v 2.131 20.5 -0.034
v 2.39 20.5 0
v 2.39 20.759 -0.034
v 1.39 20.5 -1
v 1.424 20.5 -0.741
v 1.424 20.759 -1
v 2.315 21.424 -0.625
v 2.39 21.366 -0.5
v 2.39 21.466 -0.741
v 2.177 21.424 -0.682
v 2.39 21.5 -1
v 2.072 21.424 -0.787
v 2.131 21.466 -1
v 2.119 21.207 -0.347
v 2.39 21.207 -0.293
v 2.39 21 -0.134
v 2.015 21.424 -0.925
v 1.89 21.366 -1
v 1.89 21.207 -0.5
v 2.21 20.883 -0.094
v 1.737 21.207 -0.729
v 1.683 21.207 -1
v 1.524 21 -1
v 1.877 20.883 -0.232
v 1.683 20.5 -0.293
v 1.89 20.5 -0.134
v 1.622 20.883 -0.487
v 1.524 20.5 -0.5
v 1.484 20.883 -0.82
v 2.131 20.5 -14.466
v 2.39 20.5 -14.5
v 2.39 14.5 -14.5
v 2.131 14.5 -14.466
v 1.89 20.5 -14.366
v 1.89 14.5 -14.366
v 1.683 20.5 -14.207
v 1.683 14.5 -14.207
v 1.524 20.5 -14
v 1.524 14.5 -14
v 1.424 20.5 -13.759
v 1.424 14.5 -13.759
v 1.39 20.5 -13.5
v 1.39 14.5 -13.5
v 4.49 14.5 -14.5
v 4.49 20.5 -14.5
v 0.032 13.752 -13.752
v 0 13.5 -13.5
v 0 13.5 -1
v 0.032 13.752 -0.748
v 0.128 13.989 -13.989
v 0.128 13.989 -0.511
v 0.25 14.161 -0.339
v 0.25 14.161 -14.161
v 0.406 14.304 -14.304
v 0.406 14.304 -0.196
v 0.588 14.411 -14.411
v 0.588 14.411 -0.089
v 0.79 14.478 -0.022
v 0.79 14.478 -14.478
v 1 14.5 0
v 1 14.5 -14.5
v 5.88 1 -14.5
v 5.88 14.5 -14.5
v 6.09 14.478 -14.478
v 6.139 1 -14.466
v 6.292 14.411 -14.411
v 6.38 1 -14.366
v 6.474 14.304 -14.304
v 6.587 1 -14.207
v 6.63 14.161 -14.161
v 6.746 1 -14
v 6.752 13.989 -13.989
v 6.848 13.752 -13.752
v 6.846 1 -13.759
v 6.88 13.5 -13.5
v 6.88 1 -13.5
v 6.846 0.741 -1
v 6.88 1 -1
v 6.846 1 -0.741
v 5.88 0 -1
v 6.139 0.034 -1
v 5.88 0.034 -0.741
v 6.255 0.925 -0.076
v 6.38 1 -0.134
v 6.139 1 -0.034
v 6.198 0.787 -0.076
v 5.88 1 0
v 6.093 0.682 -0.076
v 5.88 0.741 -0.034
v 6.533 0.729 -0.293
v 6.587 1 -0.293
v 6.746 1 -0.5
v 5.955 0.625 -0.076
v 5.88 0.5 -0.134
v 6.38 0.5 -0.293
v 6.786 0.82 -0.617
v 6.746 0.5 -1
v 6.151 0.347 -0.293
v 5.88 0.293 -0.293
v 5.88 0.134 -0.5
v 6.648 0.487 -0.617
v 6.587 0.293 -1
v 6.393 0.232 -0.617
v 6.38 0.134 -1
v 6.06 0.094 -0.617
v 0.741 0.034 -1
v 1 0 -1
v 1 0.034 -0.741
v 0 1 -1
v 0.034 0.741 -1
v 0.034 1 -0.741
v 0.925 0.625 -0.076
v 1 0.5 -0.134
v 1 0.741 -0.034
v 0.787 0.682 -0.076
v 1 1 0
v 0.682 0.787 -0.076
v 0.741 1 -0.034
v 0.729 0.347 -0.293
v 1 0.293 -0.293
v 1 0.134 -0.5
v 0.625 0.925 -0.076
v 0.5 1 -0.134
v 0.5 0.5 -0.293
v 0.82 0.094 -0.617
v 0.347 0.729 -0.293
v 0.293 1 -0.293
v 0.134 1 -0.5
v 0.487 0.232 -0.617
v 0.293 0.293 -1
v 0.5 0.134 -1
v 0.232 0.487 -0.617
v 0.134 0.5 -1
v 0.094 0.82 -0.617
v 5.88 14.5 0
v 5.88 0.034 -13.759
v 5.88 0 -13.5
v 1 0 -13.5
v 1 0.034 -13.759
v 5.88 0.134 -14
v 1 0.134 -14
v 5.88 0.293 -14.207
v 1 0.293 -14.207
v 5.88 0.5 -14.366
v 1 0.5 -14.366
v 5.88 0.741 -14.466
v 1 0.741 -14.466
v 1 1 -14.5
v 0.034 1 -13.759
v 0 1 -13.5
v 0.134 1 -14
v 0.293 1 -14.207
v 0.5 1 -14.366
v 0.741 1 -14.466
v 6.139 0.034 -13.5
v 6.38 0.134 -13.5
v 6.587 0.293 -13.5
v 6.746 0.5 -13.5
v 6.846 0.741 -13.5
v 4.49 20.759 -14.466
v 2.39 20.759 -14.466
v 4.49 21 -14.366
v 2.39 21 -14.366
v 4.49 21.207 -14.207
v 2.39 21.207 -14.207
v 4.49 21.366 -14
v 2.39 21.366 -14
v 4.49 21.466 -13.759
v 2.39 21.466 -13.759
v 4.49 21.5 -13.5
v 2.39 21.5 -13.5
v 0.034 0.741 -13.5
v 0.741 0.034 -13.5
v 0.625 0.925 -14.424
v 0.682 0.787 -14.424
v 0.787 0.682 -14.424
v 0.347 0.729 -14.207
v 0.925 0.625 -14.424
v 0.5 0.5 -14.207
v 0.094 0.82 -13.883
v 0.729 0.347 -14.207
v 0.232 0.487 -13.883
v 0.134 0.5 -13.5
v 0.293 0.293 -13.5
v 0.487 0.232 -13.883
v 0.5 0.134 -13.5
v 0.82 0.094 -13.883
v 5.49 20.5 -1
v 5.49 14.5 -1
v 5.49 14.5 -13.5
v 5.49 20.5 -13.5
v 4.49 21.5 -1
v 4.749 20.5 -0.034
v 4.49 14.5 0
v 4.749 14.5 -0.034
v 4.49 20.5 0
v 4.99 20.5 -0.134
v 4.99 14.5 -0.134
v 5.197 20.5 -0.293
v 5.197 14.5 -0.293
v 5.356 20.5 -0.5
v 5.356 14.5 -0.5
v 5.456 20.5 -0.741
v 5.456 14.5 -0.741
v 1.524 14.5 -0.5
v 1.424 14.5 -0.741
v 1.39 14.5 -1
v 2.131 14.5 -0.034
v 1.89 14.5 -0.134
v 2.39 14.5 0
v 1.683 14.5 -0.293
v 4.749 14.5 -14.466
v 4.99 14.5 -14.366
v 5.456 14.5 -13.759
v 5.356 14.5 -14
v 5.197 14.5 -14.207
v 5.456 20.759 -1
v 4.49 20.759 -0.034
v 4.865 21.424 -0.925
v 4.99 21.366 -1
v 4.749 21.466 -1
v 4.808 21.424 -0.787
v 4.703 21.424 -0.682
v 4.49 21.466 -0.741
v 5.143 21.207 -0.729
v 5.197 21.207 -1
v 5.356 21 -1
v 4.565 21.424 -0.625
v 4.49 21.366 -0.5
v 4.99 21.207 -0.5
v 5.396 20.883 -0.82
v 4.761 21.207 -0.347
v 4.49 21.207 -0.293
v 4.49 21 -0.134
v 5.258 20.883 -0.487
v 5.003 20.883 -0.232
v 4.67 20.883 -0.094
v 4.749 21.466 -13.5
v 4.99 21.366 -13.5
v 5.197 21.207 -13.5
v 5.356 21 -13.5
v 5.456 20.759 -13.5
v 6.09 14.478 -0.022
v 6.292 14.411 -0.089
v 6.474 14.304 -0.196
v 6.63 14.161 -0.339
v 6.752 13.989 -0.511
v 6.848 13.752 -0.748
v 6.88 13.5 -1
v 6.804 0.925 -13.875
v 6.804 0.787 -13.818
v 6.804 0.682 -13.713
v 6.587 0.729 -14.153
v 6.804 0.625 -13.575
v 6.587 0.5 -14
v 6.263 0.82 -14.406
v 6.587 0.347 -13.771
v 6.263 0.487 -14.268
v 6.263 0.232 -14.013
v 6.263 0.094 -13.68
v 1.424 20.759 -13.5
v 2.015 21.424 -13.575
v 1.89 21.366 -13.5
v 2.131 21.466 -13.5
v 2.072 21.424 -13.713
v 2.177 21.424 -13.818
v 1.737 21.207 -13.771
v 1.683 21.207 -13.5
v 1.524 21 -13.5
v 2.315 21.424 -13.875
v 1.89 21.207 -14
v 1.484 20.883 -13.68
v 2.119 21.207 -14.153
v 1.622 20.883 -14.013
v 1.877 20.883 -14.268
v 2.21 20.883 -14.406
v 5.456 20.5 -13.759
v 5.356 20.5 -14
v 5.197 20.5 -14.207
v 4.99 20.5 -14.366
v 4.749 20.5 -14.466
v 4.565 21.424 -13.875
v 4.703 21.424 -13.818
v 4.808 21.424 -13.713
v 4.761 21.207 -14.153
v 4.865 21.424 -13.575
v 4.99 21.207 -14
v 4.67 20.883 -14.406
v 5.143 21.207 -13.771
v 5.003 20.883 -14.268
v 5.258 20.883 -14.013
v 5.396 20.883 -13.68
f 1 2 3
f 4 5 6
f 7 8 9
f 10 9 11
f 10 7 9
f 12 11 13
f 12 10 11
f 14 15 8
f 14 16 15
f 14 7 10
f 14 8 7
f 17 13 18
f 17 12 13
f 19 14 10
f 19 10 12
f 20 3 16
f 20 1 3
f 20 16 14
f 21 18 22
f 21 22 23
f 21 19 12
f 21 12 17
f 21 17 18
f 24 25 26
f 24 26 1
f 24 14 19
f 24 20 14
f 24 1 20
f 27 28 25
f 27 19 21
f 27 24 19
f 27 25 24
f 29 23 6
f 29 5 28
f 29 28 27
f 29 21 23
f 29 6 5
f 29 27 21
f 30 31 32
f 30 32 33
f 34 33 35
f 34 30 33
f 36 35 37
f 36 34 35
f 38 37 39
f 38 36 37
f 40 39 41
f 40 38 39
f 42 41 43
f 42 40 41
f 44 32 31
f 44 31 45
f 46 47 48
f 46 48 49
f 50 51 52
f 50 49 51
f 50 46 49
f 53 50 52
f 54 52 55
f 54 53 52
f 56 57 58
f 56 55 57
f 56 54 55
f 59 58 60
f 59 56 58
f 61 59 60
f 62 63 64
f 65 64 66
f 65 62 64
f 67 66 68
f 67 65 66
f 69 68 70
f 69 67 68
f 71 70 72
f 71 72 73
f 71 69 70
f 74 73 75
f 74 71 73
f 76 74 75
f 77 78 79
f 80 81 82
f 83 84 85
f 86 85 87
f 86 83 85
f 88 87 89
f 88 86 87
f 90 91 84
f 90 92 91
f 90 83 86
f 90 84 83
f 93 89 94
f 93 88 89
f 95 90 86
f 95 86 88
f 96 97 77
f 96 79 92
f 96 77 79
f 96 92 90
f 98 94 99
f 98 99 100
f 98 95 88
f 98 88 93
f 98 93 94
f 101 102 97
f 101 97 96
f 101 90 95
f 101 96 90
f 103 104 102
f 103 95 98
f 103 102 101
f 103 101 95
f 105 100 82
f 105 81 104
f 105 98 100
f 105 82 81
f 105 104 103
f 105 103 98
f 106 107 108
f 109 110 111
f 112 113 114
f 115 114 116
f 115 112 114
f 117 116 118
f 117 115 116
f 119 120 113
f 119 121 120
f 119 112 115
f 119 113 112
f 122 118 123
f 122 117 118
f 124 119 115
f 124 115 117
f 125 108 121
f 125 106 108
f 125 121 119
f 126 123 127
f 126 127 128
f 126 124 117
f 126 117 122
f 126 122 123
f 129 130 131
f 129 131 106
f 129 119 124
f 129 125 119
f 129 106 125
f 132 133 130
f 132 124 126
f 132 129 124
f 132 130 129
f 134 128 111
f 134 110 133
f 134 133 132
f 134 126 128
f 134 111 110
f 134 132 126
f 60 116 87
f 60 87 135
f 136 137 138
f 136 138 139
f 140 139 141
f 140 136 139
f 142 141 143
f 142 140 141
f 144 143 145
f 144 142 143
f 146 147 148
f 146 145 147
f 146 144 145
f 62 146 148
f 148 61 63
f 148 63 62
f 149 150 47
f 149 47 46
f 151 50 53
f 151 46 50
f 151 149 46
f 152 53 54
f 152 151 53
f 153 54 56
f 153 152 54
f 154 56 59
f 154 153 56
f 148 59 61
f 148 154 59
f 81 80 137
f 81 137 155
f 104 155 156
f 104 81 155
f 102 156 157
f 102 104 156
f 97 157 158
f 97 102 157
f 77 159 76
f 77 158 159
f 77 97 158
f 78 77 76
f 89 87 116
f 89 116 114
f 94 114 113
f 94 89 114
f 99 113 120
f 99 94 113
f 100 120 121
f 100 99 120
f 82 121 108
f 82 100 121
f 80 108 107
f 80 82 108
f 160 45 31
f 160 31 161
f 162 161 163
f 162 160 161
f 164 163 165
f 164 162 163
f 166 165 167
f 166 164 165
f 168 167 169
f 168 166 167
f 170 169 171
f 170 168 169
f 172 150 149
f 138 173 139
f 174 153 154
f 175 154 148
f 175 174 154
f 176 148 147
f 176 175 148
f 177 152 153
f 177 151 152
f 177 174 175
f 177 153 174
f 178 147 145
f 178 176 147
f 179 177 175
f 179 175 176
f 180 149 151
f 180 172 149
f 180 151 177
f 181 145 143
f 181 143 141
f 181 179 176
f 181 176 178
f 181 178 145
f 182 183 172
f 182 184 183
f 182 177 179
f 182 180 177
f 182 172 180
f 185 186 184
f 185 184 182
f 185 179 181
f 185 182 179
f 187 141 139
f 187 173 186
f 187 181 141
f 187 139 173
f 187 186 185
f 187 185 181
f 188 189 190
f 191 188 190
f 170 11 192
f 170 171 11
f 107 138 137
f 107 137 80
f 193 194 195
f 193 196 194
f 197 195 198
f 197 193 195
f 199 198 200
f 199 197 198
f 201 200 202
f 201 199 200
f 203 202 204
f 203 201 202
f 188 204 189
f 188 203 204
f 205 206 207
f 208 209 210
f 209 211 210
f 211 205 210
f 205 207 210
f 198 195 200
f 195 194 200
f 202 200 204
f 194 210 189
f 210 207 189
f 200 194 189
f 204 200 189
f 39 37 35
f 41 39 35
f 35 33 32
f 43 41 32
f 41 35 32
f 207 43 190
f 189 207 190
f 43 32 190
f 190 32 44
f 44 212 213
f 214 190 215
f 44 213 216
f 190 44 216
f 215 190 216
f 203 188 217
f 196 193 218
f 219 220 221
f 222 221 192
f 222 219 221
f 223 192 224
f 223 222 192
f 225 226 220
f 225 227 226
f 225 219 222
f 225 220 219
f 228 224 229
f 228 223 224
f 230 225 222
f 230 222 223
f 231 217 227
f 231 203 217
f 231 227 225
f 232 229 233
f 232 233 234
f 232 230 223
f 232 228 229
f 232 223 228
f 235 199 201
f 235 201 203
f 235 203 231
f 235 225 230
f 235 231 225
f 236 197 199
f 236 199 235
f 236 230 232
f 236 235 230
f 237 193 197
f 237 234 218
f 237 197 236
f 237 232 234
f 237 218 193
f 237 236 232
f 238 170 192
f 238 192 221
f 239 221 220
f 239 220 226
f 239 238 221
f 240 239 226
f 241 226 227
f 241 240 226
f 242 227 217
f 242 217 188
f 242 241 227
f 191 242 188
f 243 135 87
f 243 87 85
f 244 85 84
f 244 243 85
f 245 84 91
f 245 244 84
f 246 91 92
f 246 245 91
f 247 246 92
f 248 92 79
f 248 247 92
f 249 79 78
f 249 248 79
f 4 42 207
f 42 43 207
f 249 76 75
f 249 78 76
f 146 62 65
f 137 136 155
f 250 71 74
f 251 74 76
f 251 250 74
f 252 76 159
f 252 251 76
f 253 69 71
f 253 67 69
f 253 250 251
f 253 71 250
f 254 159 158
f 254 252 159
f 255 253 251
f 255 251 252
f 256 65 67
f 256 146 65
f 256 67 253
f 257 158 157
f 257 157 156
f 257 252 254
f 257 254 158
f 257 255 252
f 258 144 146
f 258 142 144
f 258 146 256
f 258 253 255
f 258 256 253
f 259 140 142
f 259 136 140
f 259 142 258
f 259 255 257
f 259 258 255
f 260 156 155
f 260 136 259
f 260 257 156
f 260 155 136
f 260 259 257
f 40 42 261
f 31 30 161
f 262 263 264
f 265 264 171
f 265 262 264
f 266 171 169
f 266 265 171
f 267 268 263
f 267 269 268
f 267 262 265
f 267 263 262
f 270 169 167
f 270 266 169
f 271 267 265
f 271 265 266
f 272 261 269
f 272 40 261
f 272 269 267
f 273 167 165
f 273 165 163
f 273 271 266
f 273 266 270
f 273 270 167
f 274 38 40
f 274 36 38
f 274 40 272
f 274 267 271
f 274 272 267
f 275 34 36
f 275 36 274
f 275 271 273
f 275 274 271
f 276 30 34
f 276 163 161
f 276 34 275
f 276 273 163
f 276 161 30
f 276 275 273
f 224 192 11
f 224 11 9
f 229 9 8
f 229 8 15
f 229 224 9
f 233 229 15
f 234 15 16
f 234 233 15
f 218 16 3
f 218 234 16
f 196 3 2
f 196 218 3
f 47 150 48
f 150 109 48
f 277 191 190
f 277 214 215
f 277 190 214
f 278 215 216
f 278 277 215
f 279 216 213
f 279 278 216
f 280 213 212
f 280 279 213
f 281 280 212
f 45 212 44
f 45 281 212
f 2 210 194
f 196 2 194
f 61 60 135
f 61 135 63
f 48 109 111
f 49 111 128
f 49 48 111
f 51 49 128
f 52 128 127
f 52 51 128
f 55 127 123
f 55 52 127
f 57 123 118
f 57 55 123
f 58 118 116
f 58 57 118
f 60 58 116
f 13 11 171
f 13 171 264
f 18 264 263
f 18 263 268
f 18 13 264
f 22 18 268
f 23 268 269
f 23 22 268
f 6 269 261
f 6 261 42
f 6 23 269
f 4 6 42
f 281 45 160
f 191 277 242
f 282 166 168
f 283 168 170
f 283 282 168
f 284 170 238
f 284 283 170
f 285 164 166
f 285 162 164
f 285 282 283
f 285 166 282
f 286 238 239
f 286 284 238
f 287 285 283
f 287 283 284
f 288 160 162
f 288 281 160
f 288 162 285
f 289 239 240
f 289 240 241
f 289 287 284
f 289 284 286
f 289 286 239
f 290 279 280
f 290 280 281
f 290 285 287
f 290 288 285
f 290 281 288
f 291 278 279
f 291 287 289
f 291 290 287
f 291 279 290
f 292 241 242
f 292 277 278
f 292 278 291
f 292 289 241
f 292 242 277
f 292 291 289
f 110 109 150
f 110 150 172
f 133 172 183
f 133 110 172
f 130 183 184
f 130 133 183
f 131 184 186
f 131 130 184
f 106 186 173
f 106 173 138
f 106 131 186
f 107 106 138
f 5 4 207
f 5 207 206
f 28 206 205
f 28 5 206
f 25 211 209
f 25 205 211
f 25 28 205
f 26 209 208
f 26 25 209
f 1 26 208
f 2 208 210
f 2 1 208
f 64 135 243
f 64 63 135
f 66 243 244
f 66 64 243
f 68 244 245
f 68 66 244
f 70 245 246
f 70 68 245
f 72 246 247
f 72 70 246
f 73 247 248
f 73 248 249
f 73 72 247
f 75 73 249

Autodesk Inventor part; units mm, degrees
ref_plane "YZ Plane" through (0, 0, 0) normal (1, 0, 0) x (0, 1, 0)
ref_plane "XZ Plane" through (0, 0, 0) normal (0, 1, 0) x (-1, 0, 0)
ref_plane "XY Plane" through (0, 0, 0) normal (0, 0, 1) x (1, 0, 0)
sketch "Sketch1" plane through (0, 0, 0) normal (1, 0, 0) x (0, 1, 0)
  line L0 (0, 0) -> (14.5, 0)
  line L1 (14.5, 0) -> (14.5, -14.5)
  line L2 (14.5, -14.5) -> (0, -14.5)
  line L3 (0, -14.5) -> (0, 0)
  dimension "d5" = 14.5
  dimension "d6" = 14.5
extrude "Extrusion1" add sketch "Sketch1" along normal blind 6.88
sketch "Sketch2" plane through (0, 14.5, 0) normal (0, 1, 0) x (1, 0, 0)
  line L0 (0, 14.5) -> (0, 0) projected
  line L1 (0, 0) -> (6.88, 0) projected
  line L2 (6.88, 14.5) -> (6.88, 0) projected
  line L3 (0, 14.5) -> (6.88, 14.5) projected
  line L4 (1.39, 0) -> (5.49, 0)
  line L5 (5.49, 0) -> (5.49, 14.5)
  line L6 (5.49, 14.5) -> (1.39, 14.5)
  line L7 (1.39, 14.5) -> (1.39, 0)
  line L8 (0, 14.5) -> (6.88, 14.5) projected
  line L9 (0, 0) -> (6.88, 0) projected
  dimension "d12" = 4.1
  dimension "d13" = 1.39
extrude "Extrusion2" add sketch "Sketch2" along normal blind 7 separate body contours L3 L5 L1 L7
fillet "Fillet1" radius 1 10 edges at (0, 0, -7.25) (0, 7.25, -14.5) (3.44, 0, -14.5) (6.88, 7.25, -14.5) (6.88, 0, -7.25) (6.88, 7.25, 0) (0, 7.25, 0) (3.44, 0, 0) (0, 14.5, -7.25) (6.88, 14.5, -7.25)
fillet "Fillet2" radius 1 8 edges at (1.39, 18, 0) (5.49, 18, 0) (1.39, 18, -14.5) (5.49, 18, -14.5) (1.39, 21.5, -7.25) (3.44, 21.5, 0) (5.49, 21.5, -7.25) (3.44, 21.5, -14.5)
properties part number "battery_1S_100mAh"
